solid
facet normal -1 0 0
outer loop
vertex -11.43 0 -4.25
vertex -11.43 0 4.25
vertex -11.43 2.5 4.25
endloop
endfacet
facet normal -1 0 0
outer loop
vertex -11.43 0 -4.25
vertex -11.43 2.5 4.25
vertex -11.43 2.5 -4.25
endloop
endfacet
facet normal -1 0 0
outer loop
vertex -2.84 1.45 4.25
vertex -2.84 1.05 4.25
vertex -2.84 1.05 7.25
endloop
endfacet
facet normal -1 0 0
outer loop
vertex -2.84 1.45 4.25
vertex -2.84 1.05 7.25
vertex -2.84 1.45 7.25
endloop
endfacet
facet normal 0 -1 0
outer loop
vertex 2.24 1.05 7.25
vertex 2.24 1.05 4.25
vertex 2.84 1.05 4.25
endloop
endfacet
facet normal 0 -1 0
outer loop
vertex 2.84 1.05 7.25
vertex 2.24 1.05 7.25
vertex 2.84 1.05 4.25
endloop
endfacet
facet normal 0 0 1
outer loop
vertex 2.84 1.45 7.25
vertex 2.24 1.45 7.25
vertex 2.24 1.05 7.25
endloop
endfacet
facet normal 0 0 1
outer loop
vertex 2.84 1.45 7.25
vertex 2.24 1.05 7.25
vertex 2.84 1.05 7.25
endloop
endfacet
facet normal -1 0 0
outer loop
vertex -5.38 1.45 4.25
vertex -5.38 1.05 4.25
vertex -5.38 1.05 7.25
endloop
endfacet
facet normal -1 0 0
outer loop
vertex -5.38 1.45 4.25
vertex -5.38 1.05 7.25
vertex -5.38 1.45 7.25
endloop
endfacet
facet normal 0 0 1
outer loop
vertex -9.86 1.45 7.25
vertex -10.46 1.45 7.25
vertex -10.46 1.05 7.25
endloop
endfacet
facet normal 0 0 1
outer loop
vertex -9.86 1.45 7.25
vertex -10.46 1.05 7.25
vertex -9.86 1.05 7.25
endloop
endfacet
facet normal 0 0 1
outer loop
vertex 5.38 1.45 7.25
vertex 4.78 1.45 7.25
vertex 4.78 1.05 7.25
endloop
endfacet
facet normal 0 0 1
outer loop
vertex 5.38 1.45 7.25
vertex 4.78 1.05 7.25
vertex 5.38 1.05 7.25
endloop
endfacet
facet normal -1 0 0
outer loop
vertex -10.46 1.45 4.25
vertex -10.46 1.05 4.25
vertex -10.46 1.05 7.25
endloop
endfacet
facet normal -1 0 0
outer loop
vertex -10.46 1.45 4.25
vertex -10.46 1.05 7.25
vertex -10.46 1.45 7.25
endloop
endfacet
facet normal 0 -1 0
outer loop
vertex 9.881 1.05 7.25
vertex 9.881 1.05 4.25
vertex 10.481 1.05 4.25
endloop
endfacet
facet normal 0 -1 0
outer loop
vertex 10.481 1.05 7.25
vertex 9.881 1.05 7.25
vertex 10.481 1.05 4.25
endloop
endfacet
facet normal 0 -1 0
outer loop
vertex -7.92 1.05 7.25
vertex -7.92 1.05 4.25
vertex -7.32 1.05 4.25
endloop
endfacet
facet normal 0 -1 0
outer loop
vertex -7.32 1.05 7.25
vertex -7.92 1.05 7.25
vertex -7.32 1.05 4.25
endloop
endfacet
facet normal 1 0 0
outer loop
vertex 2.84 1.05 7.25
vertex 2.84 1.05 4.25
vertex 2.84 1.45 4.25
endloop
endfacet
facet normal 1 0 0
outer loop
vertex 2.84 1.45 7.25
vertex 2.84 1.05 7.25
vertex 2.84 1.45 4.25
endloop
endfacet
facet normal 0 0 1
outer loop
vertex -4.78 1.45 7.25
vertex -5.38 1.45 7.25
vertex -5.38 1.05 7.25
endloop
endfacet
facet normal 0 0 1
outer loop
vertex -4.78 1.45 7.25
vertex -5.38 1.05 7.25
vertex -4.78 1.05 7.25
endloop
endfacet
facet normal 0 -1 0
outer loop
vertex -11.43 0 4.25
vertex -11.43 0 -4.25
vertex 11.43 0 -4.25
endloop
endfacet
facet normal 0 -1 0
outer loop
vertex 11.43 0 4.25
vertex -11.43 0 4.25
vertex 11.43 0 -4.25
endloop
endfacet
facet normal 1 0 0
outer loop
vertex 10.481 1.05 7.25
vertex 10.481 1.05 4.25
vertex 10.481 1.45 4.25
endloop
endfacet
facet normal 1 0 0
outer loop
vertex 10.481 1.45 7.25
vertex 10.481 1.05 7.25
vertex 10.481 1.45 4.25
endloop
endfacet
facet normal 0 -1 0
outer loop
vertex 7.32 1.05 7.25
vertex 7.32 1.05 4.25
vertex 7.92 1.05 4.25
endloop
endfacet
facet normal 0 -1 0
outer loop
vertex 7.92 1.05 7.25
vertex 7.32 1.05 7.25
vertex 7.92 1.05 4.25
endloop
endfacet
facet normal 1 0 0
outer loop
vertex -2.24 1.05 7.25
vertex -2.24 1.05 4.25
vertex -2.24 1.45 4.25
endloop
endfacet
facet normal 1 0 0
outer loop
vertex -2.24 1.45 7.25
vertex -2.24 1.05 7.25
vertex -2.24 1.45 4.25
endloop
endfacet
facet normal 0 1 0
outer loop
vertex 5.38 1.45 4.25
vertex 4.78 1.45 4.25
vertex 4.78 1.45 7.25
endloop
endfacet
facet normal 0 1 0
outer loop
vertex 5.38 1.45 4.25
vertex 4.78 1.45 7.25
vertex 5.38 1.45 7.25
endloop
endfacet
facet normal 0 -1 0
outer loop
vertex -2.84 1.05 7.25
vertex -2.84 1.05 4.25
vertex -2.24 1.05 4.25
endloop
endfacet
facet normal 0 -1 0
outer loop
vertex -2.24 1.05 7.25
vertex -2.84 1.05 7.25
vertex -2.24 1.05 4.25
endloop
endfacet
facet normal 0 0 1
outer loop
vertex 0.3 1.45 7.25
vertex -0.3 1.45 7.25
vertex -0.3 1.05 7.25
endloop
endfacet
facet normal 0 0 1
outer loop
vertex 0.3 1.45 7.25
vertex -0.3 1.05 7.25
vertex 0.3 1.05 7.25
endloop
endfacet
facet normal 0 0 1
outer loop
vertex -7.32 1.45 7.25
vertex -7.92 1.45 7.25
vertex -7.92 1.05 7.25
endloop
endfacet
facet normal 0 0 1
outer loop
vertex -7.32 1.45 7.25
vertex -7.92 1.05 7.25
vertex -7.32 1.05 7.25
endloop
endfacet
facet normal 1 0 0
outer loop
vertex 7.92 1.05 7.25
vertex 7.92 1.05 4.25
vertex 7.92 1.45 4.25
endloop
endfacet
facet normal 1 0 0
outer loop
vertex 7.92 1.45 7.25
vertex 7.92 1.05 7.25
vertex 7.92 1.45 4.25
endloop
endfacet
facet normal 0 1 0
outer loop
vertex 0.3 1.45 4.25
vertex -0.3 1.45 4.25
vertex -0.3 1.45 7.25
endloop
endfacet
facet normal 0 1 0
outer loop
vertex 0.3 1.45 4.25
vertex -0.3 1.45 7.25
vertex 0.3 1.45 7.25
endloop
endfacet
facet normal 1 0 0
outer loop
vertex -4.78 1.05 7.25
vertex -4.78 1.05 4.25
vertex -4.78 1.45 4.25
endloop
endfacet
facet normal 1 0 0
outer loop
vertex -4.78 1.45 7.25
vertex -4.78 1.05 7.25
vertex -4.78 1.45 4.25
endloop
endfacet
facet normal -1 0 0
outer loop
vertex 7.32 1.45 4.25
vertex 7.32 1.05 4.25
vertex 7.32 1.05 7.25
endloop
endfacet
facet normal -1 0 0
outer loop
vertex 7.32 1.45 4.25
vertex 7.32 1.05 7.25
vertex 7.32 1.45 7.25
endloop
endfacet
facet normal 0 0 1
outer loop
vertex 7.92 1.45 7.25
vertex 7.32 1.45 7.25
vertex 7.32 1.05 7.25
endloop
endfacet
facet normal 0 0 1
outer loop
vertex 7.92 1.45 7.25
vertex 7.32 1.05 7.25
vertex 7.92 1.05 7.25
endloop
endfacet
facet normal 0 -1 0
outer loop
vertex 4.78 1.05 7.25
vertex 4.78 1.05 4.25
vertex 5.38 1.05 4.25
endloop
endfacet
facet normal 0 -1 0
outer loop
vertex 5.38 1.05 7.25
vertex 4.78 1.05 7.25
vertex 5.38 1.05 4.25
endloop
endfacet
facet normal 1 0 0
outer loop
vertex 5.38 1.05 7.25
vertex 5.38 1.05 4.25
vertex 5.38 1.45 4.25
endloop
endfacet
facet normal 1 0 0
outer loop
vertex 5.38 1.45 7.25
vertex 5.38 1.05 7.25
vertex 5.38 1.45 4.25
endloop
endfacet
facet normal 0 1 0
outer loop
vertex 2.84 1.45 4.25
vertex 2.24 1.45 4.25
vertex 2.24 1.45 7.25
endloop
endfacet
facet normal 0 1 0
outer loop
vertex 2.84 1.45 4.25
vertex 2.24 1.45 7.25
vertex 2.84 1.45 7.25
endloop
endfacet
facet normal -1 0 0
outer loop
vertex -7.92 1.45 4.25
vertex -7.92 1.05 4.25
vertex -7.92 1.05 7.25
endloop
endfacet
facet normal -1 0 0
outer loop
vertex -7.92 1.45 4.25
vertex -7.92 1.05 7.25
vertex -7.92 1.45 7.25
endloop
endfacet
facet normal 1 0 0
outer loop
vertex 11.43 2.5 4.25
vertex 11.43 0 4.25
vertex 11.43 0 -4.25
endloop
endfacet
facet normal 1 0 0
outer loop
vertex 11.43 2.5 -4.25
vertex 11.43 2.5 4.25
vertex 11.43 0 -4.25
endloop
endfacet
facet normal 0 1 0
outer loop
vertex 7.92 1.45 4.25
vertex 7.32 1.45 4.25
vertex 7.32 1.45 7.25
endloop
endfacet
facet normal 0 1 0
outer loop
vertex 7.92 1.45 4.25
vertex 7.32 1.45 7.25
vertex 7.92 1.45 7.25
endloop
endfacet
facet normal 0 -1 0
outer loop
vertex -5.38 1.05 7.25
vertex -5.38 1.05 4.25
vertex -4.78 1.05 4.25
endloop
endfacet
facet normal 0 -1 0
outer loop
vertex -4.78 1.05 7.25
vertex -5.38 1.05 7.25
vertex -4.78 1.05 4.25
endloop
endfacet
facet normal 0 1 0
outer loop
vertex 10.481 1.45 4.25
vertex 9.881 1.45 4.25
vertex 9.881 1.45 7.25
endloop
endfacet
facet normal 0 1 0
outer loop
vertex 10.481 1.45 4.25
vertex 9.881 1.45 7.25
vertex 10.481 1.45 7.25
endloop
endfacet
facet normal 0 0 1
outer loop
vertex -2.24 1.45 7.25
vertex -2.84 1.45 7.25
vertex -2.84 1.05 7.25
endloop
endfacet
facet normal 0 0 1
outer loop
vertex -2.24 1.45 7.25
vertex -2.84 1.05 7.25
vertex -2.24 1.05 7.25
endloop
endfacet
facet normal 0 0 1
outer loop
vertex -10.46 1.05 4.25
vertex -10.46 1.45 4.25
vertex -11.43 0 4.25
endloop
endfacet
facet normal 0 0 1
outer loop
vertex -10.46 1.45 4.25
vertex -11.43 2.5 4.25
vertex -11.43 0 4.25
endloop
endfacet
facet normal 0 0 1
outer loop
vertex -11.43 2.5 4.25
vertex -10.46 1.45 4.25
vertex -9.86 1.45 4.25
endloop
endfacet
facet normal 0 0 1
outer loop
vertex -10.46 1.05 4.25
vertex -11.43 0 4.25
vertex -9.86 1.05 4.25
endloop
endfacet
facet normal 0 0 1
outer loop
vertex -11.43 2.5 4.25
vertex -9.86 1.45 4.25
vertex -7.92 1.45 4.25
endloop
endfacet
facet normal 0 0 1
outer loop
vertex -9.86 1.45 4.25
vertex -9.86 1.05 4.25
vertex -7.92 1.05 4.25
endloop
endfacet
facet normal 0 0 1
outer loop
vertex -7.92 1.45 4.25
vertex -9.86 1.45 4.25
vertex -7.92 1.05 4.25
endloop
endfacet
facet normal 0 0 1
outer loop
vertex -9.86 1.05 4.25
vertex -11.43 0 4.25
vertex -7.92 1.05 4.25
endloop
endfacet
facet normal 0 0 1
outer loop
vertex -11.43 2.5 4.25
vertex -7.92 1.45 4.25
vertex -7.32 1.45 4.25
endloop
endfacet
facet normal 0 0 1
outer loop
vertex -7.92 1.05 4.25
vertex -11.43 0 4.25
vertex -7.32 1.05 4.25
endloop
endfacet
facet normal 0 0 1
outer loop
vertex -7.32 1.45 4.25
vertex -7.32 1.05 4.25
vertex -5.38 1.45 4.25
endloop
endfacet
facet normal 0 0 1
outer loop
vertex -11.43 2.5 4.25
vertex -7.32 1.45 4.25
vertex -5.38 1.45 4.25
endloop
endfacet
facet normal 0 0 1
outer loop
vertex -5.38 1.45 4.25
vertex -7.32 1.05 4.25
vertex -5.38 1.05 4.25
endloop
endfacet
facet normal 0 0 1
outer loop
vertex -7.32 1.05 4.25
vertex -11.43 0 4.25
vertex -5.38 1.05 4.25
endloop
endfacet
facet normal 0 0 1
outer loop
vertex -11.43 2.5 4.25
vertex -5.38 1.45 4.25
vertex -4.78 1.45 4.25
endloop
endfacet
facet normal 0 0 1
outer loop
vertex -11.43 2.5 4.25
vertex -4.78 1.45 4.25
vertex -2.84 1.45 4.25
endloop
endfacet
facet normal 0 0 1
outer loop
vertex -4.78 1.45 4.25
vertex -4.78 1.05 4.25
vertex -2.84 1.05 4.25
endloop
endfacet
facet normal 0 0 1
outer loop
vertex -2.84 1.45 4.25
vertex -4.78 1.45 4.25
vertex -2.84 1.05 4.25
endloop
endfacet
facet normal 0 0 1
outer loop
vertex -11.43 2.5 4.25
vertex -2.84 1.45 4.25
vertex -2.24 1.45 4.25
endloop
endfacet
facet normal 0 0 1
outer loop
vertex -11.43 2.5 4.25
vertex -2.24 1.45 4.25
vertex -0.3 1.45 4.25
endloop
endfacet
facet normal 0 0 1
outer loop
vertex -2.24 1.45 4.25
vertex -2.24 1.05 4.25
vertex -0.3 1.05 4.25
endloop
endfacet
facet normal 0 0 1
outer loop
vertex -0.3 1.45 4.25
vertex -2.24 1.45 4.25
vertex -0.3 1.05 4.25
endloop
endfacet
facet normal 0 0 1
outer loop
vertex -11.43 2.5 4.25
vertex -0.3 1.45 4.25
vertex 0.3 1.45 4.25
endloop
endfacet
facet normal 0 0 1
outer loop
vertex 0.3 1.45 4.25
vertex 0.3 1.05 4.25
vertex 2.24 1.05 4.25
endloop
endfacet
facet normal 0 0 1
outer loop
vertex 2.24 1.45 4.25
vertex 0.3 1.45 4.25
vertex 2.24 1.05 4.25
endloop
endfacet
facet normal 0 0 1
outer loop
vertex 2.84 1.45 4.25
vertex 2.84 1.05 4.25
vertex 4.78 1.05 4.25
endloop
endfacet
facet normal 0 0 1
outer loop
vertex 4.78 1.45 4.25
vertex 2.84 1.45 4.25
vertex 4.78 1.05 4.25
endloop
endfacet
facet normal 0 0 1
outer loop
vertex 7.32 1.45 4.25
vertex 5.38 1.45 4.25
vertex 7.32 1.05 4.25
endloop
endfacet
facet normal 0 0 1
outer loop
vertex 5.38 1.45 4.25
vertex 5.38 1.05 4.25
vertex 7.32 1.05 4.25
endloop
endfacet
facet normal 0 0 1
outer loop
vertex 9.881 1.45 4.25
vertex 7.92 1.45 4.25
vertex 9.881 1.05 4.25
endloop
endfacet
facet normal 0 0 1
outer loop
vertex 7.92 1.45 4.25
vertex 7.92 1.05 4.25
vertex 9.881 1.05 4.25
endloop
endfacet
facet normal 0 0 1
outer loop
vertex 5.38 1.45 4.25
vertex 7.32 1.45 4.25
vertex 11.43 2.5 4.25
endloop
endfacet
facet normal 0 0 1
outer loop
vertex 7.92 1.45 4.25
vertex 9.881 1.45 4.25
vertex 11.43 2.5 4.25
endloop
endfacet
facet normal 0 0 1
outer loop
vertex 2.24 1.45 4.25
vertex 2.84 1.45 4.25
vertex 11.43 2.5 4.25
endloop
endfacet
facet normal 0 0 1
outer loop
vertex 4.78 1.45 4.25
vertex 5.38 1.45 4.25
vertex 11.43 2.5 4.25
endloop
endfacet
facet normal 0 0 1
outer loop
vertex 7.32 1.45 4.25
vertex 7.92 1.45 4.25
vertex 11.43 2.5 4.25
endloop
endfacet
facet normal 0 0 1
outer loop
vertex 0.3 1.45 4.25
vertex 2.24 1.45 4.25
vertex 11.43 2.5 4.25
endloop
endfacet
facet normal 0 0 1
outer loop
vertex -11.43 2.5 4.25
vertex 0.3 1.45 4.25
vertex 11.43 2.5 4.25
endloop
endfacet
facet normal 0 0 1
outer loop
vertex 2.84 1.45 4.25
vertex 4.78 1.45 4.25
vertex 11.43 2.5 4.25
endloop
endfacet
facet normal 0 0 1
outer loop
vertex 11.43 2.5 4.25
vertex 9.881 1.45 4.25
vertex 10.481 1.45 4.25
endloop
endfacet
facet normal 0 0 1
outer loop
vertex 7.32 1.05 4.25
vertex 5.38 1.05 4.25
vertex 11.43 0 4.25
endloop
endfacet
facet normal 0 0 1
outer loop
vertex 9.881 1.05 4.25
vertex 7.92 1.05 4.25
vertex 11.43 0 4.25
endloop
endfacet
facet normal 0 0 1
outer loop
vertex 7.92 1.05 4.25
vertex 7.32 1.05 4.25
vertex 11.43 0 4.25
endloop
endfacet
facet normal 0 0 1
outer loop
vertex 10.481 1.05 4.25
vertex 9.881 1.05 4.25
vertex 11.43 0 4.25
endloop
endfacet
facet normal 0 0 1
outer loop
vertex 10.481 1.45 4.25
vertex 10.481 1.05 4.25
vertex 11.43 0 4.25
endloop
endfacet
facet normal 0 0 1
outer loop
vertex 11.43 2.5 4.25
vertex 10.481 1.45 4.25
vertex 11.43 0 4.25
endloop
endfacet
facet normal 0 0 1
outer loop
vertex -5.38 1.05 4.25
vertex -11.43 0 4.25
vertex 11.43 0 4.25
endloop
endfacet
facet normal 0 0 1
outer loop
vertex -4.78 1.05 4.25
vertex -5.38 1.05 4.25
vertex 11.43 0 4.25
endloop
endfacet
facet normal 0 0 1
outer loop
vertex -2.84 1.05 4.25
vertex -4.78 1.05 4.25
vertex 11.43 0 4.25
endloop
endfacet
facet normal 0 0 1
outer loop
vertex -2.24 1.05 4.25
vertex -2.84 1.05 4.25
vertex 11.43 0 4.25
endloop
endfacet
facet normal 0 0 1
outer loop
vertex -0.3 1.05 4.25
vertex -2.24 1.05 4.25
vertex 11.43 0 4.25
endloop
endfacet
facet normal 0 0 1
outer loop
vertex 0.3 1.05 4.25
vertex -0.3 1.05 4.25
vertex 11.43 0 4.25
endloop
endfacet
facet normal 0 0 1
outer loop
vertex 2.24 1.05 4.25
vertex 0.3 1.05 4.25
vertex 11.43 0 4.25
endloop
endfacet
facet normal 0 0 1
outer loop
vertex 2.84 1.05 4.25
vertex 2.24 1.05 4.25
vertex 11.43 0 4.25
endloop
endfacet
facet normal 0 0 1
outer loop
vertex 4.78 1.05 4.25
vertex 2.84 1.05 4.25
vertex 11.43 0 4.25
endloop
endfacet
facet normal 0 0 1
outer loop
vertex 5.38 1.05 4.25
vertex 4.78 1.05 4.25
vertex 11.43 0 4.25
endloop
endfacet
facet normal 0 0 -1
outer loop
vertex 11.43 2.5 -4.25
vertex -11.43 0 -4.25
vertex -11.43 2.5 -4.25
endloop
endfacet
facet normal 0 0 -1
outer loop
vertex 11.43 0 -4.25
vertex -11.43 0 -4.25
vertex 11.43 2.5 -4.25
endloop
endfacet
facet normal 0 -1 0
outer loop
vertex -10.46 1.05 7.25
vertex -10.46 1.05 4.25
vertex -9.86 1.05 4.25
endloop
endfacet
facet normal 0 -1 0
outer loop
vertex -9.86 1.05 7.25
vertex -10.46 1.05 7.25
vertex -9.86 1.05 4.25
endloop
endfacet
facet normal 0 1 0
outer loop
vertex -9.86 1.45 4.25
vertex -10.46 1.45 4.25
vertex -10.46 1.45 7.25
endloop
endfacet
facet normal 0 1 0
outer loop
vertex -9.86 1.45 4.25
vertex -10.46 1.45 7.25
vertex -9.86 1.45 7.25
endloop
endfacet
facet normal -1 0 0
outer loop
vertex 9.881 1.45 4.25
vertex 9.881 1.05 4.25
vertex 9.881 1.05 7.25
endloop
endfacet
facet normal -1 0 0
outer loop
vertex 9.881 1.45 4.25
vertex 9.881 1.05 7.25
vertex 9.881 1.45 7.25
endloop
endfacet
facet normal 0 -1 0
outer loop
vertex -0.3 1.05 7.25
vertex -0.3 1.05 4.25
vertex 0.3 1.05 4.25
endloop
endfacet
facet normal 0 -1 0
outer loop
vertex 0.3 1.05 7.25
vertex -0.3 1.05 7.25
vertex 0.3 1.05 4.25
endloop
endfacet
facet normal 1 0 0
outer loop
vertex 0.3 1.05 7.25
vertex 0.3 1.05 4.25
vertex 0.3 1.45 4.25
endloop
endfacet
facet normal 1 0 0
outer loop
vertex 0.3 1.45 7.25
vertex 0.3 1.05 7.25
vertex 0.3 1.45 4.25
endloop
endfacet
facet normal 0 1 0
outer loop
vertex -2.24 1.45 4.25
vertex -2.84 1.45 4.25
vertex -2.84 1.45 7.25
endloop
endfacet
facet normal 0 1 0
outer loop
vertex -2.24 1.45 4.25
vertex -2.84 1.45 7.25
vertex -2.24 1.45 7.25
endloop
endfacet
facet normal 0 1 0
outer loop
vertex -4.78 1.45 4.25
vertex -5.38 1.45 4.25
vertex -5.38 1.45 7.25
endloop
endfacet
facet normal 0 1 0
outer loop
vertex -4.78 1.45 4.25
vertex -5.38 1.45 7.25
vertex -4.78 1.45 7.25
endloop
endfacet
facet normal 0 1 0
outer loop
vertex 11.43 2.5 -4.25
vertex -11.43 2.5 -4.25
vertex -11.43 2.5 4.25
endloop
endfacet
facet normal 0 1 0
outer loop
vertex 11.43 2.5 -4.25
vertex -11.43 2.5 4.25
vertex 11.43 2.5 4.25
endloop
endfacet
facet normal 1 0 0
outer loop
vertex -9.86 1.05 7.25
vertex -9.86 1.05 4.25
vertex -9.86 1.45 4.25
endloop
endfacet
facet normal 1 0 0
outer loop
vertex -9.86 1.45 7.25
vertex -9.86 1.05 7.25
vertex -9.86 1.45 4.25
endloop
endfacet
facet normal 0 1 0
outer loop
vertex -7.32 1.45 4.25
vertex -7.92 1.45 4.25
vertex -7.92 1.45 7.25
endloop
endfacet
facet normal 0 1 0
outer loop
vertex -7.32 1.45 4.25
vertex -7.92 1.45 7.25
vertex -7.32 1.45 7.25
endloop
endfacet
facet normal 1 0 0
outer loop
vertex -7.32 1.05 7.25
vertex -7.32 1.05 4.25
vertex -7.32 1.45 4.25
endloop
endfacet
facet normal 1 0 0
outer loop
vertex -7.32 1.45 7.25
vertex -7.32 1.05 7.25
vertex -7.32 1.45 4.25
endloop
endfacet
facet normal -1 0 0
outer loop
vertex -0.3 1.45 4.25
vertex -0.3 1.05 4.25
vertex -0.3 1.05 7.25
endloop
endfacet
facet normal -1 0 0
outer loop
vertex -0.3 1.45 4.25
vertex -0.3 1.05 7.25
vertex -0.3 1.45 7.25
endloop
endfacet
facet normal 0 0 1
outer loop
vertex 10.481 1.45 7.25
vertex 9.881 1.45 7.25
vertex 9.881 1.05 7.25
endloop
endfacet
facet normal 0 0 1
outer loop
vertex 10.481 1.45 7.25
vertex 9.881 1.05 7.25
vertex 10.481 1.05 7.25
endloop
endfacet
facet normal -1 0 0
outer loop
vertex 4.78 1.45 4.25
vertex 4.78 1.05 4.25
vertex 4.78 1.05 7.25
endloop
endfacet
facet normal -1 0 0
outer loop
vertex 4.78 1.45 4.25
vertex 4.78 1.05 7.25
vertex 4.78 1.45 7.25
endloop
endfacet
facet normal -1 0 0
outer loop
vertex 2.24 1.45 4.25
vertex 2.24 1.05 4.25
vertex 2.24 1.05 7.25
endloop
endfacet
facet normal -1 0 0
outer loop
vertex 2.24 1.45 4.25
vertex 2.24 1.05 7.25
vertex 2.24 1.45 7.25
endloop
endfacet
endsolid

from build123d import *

# Parameters (mm, degrees)
SKETCH_1_W      = 22.86
SKETCH_1_H      = 8.5
EXTRUDE_1_DEPTH = 2.5
SKETCH_2_W      = 0.6
SKETCH_2_H      = 0.4
EXTRUDE_2_DEPTH = 3


with BuildPart() as part:
    # Эскиз1 → Бобышка-Вытянуть1 (new body)
    with BuildSketch(Plane(origin=(0, 0, 0), x_dir=(1, 0, 0), z_dir=(0, 1, 0))):
        Rectangle(SKETCH_1_W, SKETCH_1_H)
    extrude(amount=EXTRUDE_1_DEPTH)

    # Эскиз2 → Бобышка-Вытянуть2 (add)
    with BuildSketch(Plane.XY.offset(4.25)):
        with Locations((-7.62, 1.25)):
            Rectangle(SKETCH_2_W, SKETCH_2_H)
        with Locations((-10.16, 1.25)):
            Rectangle(SKETCH_2_W, SKETCH_2_H)
        with Locations((-5.08, 1.25)):
            Rectangle(SKETCH_2_W, SKETCH_2_H)
        with Locations((-2.54, 1.25)):
            Rectangle(SKETCH_2_W, SKETCH_2_H)
        with Locations((0, 1.25)):
            Rectangle(SKETCH_2_W, SKETCH_2_H)
        with Locations((2.54, 1.25)):
            Rectangle(SKETCH_2_W, SKETCH_2_H)
        with Locations((5.08, 1.25)):
            Rectangle(SKETCH_2_W, SKETCH_2_H)
        with Locations((7.62, 1.25)):
            Rectangle(SKETCH_2_W, SKETCH_2_H)
        with Locations((10.180976984, 1.25)):
            Rectangle(SKETCH_2_W, SKETCH_2_H)
    extrude(amount=EXTRUDE_2_DEPTH)


solid = part.part
